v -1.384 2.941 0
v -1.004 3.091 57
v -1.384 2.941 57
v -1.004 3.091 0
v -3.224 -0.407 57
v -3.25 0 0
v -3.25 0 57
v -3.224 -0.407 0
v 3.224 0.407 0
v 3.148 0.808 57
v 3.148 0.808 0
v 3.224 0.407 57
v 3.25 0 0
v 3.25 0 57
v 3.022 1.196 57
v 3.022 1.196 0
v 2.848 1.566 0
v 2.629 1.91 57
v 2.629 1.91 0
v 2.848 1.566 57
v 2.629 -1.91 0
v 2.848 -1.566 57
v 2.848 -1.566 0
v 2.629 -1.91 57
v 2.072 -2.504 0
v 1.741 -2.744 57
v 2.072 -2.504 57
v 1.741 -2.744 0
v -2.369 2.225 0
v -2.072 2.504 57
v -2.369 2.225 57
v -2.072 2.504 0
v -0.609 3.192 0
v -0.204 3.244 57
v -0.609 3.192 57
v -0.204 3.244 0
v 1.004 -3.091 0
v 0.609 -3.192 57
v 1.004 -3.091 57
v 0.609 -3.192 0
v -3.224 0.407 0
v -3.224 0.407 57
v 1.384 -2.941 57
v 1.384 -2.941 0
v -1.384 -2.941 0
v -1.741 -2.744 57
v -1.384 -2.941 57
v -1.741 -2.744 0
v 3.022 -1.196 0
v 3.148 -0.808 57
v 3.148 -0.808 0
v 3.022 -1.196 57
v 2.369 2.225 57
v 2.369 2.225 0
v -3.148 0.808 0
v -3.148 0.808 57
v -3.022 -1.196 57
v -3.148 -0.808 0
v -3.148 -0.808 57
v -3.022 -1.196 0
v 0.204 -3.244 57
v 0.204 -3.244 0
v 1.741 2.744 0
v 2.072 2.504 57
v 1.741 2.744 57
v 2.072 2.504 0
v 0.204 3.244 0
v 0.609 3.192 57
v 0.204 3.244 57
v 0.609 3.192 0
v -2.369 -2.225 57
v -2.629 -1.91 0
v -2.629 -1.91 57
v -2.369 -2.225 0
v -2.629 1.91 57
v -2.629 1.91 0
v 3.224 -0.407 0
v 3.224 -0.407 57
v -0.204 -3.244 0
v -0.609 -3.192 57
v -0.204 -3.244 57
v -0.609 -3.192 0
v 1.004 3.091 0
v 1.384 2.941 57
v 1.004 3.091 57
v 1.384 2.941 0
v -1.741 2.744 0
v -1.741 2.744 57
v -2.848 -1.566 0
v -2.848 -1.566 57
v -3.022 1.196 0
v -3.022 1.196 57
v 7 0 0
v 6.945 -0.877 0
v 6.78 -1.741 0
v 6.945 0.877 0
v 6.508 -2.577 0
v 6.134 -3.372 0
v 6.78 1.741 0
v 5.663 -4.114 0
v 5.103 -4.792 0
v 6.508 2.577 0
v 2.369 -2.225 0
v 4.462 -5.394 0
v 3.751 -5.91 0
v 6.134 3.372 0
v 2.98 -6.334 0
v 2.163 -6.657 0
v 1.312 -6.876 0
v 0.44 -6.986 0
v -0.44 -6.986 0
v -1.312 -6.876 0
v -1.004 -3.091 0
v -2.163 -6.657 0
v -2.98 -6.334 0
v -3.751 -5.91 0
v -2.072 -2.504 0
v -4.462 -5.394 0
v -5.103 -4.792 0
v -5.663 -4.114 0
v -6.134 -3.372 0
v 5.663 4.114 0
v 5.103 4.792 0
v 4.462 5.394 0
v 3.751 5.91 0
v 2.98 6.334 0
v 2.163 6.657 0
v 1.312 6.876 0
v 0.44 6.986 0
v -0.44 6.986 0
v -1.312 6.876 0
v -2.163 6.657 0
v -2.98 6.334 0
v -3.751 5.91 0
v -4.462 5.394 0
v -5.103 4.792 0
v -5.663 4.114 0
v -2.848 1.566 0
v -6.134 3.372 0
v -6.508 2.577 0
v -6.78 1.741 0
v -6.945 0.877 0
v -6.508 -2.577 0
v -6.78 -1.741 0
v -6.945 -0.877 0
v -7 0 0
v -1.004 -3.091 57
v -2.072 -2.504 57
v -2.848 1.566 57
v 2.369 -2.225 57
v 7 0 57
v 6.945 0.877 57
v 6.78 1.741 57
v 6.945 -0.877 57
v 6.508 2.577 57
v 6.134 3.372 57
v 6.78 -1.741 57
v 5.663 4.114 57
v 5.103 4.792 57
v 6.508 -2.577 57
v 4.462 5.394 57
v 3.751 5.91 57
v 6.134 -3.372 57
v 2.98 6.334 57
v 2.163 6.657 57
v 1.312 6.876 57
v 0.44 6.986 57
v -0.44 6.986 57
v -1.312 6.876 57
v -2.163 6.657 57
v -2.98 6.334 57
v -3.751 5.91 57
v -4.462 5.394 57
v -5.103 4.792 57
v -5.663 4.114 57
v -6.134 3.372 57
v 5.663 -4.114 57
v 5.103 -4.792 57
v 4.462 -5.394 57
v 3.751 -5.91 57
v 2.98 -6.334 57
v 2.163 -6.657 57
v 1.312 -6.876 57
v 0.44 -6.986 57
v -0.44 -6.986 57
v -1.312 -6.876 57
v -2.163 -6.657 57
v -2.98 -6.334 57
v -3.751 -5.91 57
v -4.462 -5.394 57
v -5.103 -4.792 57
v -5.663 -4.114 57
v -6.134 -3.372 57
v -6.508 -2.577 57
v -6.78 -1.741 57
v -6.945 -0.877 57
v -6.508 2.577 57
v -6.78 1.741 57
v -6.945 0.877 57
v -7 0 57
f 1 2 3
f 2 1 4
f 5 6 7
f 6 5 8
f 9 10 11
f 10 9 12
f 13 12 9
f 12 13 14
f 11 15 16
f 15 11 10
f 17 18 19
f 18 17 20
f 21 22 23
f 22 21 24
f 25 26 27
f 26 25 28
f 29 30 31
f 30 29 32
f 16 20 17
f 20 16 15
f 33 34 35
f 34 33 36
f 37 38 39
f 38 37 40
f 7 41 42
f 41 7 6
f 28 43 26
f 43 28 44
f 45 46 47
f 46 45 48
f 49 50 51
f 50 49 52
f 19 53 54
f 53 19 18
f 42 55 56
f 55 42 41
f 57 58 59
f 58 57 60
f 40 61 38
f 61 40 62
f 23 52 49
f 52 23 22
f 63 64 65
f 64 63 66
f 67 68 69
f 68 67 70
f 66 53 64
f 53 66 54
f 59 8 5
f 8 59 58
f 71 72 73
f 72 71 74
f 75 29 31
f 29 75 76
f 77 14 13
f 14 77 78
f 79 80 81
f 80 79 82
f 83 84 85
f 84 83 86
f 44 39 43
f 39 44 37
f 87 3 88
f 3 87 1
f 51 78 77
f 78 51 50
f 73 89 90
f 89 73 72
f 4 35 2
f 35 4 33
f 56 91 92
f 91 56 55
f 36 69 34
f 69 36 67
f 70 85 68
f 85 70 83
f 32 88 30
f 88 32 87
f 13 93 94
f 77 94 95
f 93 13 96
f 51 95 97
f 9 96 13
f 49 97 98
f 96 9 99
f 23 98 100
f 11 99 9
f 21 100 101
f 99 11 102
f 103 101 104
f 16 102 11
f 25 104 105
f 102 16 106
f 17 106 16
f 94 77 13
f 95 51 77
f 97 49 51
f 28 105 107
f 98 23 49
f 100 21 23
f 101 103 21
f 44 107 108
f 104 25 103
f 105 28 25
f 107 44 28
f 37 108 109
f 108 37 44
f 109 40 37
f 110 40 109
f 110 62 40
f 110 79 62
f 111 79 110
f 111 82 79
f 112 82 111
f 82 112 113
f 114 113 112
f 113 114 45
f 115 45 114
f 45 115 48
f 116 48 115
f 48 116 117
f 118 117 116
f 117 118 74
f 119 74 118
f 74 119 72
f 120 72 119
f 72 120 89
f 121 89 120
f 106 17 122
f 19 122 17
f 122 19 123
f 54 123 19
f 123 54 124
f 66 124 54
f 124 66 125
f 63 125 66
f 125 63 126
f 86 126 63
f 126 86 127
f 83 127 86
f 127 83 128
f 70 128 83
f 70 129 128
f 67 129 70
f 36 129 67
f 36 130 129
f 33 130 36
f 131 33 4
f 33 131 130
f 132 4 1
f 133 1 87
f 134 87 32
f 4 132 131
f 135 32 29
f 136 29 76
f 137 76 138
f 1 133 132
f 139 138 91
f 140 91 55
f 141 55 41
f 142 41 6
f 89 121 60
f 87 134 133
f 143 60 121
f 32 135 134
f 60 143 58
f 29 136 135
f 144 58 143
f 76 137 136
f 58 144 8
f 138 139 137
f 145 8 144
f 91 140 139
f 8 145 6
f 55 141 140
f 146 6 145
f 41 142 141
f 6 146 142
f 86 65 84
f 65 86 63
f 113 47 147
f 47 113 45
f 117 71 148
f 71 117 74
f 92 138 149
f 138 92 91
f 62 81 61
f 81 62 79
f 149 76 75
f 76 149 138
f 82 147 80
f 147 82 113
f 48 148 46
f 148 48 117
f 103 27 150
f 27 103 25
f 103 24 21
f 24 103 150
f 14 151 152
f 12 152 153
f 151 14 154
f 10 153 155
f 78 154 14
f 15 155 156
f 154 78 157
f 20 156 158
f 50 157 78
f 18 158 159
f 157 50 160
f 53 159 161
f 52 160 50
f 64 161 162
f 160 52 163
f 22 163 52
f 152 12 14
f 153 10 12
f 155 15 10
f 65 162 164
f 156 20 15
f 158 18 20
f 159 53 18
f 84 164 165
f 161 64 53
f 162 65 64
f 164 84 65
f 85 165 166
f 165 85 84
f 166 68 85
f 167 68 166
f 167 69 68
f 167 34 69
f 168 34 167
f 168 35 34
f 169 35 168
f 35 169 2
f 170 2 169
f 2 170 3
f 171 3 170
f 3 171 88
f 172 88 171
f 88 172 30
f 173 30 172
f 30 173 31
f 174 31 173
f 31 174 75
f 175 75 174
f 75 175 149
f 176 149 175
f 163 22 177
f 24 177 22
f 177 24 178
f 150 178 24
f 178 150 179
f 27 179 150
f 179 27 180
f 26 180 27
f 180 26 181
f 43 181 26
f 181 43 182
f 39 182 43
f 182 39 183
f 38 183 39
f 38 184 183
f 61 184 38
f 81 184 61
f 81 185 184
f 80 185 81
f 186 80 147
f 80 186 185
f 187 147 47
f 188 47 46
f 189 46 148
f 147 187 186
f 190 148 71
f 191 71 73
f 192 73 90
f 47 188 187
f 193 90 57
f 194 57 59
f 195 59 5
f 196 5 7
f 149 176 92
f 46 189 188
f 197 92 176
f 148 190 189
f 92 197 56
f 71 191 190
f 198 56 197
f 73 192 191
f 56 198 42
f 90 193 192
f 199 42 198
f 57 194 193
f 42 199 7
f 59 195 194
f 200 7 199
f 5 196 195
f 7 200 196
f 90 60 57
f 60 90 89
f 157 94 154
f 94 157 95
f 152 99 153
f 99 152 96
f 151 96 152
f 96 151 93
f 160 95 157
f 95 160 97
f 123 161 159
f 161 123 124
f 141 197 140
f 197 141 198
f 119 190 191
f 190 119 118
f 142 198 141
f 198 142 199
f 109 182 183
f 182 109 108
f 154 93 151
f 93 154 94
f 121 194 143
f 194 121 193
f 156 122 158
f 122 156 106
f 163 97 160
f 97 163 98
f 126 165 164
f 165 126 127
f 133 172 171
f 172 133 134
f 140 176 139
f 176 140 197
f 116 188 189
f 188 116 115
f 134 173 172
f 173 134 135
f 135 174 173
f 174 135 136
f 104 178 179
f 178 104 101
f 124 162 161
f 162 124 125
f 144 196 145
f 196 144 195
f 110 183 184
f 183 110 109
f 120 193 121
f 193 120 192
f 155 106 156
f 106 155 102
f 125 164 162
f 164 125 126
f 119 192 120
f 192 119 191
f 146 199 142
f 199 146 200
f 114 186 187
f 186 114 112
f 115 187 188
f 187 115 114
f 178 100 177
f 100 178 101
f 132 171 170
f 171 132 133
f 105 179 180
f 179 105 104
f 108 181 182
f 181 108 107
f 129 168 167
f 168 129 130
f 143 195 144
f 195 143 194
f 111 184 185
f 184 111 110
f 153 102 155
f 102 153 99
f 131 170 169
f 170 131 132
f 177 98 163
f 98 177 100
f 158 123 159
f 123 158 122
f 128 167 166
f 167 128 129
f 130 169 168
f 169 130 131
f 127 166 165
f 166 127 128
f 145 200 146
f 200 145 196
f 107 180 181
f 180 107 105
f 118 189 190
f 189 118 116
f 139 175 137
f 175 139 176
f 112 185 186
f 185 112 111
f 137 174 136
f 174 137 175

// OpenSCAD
$fn = 50;


difference() {
	union() {
		cylinder(h = 57, r = 7.0000000000);
	}
	union() {
		cylinder(h = 57, r = 3.2500000000);
		cylinder(h = 57, r = 3.2500000000);
		cylinder(h = 57, r = 1.8000000000);
		cylinder(h = 57, r = 1.8000000000);
		cylinder(h = 57, r = 1.8000000000);
		cylinder(h = 57, r = 1.8000000000);
		cylinder(h = 57, r = 1.8000000000);
		cylinder(h = 57, r = 1.8000000000);
	}
}
